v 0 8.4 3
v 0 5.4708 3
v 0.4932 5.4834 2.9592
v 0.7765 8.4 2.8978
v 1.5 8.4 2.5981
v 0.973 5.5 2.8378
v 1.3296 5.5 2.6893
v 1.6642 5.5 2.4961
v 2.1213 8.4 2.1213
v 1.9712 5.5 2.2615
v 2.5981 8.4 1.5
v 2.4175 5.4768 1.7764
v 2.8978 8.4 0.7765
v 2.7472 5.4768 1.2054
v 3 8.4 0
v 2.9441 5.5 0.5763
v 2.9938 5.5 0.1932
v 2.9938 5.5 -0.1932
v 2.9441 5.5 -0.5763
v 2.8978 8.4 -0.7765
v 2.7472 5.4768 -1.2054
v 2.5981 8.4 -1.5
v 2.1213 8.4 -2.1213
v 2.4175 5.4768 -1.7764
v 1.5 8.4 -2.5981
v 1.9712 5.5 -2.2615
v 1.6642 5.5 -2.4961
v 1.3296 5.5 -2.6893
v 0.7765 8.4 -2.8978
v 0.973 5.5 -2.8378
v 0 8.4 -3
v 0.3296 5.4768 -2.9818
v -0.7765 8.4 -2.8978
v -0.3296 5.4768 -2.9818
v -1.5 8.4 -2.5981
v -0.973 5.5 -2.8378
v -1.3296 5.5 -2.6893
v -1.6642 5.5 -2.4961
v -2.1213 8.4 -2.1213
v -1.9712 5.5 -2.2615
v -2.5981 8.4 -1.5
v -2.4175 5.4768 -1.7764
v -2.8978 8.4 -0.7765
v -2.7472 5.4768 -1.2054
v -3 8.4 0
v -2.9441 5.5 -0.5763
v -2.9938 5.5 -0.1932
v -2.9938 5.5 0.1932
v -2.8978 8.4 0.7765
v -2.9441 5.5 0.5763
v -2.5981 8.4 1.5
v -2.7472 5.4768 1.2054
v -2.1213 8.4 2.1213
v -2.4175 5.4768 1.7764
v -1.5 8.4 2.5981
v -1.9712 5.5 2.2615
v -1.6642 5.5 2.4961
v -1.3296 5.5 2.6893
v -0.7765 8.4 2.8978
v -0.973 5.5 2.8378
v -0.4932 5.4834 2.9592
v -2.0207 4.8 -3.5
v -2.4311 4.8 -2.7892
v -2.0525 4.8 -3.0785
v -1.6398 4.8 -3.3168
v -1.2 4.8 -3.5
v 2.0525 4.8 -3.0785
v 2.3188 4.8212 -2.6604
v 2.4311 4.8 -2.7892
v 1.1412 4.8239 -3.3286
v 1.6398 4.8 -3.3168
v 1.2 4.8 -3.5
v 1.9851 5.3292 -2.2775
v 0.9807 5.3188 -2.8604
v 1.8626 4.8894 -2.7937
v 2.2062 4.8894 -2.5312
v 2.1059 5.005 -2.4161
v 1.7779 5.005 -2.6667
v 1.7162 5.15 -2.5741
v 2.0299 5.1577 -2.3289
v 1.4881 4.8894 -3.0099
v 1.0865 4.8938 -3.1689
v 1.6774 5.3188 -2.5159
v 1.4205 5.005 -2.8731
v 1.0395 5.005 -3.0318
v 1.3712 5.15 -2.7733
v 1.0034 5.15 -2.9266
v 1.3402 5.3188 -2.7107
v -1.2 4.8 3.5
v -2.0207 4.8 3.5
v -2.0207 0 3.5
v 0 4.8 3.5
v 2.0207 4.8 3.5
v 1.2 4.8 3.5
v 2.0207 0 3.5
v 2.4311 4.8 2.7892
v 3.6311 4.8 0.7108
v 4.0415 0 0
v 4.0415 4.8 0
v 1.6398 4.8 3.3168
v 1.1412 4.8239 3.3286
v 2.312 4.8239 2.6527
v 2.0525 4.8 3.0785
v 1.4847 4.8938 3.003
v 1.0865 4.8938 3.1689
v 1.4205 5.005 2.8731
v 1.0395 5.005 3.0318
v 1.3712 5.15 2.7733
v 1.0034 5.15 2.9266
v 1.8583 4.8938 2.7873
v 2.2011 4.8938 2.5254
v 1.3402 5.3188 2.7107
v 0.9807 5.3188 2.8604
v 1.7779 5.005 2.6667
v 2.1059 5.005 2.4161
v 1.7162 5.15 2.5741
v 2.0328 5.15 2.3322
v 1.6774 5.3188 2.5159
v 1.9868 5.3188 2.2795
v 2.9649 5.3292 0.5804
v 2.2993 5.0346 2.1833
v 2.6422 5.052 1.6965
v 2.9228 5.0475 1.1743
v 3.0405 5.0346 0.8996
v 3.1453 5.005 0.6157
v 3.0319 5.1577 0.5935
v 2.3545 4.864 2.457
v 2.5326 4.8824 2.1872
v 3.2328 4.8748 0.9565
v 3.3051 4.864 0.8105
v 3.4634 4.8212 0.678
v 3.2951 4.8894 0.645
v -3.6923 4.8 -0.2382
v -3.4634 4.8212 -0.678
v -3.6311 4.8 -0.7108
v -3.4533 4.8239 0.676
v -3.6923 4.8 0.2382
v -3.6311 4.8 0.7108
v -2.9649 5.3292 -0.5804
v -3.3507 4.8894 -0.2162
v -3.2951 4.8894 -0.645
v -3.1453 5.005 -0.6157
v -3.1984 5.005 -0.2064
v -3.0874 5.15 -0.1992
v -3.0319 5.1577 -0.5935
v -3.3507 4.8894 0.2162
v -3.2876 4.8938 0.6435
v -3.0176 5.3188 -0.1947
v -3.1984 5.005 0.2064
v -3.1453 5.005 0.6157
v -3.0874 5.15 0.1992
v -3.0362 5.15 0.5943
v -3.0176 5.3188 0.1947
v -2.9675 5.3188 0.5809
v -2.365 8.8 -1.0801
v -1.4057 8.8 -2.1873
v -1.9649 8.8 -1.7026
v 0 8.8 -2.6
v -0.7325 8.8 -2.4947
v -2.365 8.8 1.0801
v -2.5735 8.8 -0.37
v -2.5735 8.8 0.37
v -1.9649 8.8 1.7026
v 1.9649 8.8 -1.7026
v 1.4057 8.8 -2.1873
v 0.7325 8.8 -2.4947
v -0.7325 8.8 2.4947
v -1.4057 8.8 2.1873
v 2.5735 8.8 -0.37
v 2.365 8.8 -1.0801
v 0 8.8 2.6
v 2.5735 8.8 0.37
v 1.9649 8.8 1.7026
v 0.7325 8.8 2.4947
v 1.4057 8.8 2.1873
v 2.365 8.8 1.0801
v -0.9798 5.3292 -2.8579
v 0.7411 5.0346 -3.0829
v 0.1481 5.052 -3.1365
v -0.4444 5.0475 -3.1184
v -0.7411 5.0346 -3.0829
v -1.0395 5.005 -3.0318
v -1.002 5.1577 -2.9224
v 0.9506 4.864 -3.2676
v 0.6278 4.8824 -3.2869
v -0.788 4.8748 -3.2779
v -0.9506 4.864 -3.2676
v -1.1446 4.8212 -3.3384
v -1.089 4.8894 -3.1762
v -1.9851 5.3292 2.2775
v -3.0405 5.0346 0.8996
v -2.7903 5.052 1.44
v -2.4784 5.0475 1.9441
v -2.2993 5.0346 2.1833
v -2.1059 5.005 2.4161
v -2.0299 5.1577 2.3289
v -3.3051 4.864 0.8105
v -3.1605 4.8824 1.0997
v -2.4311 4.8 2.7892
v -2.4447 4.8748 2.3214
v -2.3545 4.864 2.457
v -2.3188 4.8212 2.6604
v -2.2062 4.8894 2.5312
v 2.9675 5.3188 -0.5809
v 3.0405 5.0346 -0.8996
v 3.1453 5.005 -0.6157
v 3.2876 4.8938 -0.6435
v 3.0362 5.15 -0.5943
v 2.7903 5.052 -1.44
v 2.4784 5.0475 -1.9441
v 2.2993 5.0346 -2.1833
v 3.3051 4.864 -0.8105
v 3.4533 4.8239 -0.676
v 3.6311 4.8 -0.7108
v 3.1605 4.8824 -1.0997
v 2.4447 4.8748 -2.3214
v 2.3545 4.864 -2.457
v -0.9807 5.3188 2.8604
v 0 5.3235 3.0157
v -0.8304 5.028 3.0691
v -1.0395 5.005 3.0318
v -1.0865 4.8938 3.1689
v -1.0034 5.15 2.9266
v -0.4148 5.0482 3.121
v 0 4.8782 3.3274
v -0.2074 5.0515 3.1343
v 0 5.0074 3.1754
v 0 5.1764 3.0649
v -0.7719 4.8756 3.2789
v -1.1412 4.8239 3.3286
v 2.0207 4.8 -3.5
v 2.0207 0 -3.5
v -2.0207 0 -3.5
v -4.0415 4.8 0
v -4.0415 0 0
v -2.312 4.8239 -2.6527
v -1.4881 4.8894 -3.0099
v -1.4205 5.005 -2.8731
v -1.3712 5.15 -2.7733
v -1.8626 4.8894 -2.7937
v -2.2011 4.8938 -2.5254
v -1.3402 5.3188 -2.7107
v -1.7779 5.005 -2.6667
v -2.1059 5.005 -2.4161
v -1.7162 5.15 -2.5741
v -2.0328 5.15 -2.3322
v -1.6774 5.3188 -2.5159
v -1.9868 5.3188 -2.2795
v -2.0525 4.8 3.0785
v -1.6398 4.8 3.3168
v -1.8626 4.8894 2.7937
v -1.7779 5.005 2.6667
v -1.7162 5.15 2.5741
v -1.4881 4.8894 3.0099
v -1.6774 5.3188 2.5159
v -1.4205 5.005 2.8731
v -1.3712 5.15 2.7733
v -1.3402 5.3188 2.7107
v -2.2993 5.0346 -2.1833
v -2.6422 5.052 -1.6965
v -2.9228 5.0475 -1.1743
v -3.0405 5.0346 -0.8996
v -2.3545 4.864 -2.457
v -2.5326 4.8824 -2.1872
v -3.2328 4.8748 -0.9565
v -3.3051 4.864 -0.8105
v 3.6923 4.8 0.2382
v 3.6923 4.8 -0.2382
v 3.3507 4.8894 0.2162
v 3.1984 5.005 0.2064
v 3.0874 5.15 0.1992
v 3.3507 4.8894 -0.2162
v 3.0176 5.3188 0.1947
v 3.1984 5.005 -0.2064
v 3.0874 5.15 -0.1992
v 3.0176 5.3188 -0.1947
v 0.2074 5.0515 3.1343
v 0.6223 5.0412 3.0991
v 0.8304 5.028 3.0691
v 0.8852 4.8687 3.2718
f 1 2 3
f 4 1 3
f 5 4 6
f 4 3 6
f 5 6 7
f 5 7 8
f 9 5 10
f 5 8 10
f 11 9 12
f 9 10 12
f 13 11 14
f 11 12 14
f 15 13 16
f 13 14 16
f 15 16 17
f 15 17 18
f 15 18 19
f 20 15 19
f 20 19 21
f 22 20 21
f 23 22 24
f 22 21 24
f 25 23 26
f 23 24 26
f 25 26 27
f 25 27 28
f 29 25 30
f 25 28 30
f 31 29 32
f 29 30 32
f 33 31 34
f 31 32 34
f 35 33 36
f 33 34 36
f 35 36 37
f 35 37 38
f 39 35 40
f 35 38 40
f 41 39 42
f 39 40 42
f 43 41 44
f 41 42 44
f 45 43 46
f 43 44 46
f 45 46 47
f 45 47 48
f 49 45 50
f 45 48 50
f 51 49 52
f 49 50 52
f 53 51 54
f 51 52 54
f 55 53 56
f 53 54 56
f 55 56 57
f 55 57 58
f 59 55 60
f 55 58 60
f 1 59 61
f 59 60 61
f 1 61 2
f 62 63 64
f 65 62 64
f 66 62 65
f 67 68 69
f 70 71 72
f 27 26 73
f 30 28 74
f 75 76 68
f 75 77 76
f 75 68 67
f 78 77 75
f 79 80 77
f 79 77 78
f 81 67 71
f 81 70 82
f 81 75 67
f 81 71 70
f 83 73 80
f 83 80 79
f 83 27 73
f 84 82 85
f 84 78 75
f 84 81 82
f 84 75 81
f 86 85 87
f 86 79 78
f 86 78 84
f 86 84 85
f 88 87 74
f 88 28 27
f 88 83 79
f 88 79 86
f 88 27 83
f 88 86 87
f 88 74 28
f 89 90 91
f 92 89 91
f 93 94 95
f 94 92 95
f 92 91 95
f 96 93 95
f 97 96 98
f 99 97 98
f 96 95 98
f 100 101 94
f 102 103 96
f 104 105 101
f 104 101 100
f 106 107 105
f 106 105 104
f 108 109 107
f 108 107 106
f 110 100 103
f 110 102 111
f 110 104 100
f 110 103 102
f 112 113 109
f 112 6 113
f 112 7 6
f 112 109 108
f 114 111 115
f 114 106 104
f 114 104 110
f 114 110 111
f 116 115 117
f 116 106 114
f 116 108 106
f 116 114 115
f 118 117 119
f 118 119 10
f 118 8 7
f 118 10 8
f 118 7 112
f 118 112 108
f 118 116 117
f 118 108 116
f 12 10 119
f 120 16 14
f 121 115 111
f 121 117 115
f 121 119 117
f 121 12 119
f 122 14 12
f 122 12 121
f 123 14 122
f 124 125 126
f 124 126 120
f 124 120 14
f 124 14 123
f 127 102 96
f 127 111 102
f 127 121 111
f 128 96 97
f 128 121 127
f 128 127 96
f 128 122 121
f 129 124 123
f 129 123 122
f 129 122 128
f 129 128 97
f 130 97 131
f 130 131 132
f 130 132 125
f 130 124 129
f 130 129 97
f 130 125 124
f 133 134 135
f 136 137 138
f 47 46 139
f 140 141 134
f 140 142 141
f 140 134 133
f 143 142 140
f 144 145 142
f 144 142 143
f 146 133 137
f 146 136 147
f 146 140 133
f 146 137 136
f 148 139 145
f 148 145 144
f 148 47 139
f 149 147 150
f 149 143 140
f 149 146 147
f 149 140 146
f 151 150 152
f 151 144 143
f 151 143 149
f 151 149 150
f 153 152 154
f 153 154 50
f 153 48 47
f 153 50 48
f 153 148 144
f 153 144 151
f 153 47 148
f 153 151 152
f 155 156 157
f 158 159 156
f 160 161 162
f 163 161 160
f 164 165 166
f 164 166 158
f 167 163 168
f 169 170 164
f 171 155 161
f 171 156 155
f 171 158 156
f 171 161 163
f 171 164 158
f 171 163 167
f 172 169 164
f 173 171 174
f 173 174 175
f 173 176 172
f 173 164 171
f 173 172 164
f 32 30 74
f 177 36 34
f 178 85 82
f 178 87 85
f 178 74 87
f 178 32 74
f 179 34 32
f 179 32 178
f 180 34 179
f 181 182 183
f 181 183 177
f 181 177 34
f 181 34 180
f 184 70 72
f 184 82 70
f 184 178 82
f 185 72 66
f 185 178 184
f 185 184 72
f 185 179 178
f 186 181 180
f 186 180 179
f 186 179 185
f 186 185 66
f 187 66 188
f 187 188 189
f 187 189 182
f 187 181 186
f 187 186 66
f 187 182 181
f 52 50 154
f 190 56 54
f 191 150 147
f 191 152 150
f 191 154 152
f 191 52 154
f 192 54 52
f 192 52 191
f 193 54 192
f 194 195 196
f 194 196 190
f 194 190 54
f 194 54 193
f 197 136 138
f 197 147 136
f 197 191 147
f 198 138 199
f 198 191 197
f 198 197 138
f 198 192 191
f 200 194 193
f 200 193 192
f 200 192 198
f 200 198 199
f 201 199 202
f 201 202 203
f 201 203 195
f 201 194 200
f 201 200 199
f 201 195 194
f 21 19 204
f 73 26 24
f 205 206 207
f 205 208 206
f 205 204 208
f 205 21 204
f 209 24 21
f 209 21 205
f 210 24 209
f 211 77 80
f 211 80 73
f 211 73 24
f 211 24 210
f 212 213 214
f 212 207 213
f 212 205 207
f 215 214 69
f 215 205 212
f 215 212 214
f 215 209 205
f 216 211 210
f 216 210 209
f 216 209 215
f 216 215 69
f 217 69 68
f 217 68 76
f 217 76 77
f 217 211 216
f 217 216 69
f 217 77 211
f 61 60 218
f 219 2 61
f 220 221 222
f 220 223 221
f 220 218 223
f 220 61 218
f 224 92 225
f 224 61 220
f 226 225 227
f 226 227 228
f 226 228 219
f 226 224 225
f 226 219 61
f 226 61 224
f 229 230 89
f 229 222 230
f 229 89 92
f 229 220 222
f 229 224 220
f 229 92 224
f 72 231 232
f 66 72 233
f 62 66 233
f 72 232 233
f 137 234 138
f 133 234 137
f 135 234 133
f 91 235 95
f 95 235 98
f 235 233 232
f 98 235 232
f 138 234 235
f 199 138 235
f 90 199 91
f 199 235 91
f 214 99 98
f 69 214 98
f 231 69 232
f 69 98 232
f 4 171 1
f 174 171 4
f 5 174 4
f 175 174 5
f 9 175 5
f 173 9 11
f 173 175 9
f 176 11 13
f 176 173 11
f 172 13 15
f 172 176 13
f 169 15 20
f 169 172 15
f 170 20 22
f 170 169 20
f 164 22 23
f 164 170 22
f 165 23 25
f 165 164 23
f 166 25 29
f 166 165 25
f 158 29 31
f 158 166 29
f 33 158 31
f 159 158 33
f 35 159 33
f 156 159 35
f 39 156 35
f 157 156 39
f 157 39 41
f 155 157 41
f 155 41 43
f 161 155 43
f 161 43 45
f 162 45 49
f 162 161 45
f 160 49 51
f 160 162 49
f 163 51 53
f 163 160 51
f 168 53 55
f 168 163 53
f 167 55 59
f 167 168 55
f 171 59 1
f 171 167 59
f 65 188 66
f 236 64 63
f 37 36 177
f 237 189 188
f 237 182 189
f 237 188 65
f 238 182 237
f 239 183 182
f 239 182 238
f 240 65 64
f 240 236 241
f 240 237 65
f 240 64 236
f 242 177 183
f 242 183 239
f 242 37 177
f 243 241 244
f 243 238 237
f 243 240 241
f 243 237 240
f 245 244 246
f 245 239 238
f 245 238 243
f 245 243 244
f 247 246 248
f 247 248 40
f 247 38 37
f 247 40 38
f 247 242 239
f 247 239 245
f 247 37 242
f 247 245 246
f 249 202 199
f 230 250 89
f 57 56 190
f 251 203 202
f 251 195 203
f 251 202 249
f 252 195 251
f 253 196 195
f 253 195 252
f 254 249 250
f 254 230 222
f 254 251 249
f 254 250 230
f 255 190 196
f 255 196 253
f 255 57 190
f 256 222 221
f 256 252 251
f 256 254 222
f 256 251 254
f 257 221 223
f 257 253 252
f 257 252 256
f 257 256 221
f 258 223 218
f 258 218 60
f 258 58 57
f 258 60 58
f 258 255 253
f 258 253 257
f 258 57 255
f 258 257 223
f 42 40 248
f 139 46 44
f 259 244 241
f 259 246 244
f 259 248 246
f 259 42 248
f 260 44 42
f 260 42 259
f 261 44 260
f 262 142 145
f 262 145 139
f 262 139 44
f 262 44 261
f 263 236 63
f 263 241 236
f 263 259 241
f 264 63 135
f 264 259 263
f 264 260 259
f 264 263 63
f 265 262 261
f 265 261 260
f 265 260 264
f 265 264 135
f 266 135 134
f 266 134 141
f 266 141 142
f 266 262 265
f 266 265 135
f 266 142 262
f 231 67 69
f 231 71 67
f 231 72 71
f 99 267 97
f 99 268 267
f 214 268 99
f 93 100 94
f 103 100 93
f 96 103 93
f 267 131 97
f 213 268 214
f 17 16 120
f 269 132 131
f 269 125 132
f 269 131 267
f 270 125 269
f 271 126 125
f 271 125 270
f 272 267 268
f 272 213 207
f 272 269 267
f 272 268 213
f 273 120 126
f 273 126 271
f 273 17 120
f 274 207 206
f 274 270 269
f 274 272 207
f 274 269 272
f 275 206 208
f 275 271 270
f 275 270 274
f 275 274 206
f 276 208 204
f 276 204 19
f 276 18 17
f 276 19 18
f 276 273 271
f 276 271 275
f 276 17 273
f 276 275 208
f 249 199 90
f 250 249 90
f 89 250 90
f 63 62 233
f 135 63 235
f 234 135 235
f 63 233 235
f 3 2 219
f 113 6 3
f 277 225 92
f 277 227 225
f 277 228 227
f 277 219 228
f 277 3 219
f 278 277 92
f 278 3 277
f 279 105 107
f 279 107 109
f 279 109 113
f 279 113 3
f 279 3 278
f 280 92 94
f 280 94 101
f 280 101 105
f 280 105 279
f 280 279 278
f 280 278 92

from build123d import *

# Parameters (mm, degrees)
EXTRUDE_1_DEPTH = 4.8
SKETCH_2_R      = 3
EXTRUDE_2_DEPTH = 4
FILLET_4_R      = 0.7
CHAMFER_1_SIZE  = 0.4


with BuildPart() as part:
    # Эскиз1 → Бобышка-Вытянуть1 (new body)
    with BuildSketch(Plane(origin=(0, 0, 0), x_dir=(1, 0, 0), z_dir=(0, 1, 0))):
        Polygon((4.041451884, 0), (2.020725942, 3.5), (-2.020725942, 3.5), (-4.041451884, 0), (-2.020725942, -3.5), (2.020725942, -3.5), align=None)
    extrude(amount=EXTRUDE_1_DEPTH)

    # Эскиз2 → Бобышка-Вытянуть2 (add)
    with BuildSketch(Plane(origin=(0, 4.8, 0), x_dir=(1, 0, 0), z_dir=(0, 1, 0))):
        with Locations(Location((0, 0, 0), (0, 0, 270))):
            Circle(SKETCH_2_R)
    extrude(amount=EXTRUDE_2_DEPTH)

    # Скругление4
    fillet_4_edges = [part.edges().sort_by_distance(p)[0] for p in [
        (0, 4.8, -3),
    ]]
    fillet(fillet_4_edges, radius=FILLET_4_R)

    # Фаска1
    chamfer_1_edges = [part.edges().sort_by_distance(p)[0] for p in [
        (0, 8.8, -3),
    ]]
    chamfer(chamfer_1_edges, length=CHAMFER_1_SIZE)


solid = part.part
